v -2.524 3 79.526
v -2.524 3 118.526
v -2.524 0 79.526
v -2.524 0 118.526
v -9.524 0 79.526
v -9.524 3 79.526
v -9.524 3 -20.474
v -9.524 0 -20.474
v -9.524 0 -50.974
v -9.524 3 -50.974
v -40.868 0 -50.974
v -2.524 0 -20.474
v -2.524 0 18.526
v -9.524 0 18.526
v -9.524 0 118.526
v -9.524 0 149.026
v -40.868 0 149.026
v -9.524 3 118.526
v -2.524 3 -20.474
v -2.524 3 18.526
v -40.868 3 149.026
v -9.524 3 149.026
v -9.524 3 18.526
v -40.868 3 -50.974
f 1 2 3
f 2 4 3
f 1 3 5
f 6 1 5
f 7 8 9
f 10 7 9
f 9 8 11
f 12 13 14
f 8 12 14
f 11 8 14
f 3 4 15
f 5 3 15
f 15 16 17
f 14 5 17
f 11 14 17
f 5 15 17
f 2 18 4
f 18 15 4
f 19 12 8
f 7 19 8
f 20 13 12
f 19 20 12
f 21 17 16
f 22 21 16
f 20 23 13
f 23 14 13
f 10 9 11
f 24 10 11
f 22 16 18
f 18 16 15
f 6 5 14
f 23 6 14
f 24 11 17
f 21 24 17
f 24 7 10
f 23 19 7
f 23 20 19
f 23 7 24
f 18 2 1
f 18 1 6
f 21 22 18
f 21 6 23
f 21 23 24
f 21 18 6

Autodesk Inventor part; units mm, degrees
ref_plane "YZ Plane" through (0, 0, 0) normal (1, 0, 0) x (0, 1, 0)
ref_plane "XZ Plane" through (0, 0, 0) normal (0, 1, 0) x (-1, 0, 0)
ref_plane "XY Plane" through (0, 0, 0) normal (0, 0, 1) x (1, 0, 0)
sketch "Sketch1" plane through (0, 0, 0) normal (0, 1, 0) x (-1, 0, 0)
  line L0 (40.8683, 149.0264) -> (9.5242, 149.0264)
  line L1 (9.5242, -50.9736) -> (40.8683, -50.9736)
  line L2 (40.8683, -50.9736) -> (40.8683, 149.0264)
  line L3 (9.5242, 118.5264) -> (2.5242, 118.5264)
  line L4 (2.5242, 118.5264) -> (2.5242, 79.5264)
  line L5 (2.5242, 79.5264) -> (9.5242, 79.5264)
  line L6 (9.5242, 18.5264) -> (2.5242, 18.5264)
  line L7 (2.5242, 18.5264) -> (2.5242, -20.4736)
  line L8 (2.5242, -20.4736) -> (9.5242, -20.4736)
  line L9 (9.5242, 149.0264) -> (9.5242, 118.5264)
  line L10 (9.5242, 79.5264) -> (9.5242, 18.5264)
  line L11 (9.5242, -20.4736) -> (9.5242, -50.9736)
  point P0 (0, 0)
  dimension "d1" = 200
  dimension "d2" = 30.5
  dimension "d3" = 30.5
  dimension "d4" = 61
  dimension "d5" = 39
  dimension "d6" = 7
extrude "Extrusion1" add sketch "Sketch1" along normal blind 3
properties part number "track_guides_3mm"
